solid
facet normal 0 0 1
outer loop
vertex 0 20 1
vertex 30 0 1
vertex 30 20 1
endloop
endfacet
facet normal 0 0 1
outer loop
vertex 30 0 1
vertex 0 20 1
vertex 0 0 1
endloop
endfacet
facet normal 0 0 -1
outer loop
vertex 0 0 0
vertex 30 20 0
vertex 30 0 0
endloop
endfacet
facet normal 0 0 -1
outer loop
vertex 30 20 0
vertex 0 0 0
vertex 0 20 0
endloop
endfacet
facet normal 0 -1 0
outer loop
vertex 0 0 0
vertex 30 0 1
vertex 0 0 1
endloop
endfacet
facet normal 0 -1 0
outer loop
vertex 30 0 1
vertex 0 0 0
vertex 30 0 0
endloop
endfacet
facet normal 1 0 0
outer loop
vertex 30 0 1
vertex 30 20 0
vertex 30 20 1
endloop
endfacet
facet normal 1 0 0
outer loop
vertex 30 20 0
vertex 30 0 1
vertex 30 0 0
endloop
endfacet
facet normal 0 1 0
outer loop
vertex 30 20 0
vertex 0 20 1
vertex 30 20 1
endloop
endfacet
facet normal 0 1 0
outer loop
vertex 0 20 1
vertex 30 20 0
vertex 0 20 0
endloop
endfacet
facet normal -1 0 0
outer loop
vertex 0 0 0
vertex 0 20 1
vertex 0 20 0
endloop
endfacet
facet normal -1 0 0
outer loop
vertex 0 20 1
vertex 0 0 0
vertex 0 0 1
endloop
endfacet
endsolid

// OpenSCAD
$fa=0.5; // default minimum facet angle is now 0.5
$fs=0.05; // default minimum facet size is now 0.05 mm

cube([30, 20, 1]);
